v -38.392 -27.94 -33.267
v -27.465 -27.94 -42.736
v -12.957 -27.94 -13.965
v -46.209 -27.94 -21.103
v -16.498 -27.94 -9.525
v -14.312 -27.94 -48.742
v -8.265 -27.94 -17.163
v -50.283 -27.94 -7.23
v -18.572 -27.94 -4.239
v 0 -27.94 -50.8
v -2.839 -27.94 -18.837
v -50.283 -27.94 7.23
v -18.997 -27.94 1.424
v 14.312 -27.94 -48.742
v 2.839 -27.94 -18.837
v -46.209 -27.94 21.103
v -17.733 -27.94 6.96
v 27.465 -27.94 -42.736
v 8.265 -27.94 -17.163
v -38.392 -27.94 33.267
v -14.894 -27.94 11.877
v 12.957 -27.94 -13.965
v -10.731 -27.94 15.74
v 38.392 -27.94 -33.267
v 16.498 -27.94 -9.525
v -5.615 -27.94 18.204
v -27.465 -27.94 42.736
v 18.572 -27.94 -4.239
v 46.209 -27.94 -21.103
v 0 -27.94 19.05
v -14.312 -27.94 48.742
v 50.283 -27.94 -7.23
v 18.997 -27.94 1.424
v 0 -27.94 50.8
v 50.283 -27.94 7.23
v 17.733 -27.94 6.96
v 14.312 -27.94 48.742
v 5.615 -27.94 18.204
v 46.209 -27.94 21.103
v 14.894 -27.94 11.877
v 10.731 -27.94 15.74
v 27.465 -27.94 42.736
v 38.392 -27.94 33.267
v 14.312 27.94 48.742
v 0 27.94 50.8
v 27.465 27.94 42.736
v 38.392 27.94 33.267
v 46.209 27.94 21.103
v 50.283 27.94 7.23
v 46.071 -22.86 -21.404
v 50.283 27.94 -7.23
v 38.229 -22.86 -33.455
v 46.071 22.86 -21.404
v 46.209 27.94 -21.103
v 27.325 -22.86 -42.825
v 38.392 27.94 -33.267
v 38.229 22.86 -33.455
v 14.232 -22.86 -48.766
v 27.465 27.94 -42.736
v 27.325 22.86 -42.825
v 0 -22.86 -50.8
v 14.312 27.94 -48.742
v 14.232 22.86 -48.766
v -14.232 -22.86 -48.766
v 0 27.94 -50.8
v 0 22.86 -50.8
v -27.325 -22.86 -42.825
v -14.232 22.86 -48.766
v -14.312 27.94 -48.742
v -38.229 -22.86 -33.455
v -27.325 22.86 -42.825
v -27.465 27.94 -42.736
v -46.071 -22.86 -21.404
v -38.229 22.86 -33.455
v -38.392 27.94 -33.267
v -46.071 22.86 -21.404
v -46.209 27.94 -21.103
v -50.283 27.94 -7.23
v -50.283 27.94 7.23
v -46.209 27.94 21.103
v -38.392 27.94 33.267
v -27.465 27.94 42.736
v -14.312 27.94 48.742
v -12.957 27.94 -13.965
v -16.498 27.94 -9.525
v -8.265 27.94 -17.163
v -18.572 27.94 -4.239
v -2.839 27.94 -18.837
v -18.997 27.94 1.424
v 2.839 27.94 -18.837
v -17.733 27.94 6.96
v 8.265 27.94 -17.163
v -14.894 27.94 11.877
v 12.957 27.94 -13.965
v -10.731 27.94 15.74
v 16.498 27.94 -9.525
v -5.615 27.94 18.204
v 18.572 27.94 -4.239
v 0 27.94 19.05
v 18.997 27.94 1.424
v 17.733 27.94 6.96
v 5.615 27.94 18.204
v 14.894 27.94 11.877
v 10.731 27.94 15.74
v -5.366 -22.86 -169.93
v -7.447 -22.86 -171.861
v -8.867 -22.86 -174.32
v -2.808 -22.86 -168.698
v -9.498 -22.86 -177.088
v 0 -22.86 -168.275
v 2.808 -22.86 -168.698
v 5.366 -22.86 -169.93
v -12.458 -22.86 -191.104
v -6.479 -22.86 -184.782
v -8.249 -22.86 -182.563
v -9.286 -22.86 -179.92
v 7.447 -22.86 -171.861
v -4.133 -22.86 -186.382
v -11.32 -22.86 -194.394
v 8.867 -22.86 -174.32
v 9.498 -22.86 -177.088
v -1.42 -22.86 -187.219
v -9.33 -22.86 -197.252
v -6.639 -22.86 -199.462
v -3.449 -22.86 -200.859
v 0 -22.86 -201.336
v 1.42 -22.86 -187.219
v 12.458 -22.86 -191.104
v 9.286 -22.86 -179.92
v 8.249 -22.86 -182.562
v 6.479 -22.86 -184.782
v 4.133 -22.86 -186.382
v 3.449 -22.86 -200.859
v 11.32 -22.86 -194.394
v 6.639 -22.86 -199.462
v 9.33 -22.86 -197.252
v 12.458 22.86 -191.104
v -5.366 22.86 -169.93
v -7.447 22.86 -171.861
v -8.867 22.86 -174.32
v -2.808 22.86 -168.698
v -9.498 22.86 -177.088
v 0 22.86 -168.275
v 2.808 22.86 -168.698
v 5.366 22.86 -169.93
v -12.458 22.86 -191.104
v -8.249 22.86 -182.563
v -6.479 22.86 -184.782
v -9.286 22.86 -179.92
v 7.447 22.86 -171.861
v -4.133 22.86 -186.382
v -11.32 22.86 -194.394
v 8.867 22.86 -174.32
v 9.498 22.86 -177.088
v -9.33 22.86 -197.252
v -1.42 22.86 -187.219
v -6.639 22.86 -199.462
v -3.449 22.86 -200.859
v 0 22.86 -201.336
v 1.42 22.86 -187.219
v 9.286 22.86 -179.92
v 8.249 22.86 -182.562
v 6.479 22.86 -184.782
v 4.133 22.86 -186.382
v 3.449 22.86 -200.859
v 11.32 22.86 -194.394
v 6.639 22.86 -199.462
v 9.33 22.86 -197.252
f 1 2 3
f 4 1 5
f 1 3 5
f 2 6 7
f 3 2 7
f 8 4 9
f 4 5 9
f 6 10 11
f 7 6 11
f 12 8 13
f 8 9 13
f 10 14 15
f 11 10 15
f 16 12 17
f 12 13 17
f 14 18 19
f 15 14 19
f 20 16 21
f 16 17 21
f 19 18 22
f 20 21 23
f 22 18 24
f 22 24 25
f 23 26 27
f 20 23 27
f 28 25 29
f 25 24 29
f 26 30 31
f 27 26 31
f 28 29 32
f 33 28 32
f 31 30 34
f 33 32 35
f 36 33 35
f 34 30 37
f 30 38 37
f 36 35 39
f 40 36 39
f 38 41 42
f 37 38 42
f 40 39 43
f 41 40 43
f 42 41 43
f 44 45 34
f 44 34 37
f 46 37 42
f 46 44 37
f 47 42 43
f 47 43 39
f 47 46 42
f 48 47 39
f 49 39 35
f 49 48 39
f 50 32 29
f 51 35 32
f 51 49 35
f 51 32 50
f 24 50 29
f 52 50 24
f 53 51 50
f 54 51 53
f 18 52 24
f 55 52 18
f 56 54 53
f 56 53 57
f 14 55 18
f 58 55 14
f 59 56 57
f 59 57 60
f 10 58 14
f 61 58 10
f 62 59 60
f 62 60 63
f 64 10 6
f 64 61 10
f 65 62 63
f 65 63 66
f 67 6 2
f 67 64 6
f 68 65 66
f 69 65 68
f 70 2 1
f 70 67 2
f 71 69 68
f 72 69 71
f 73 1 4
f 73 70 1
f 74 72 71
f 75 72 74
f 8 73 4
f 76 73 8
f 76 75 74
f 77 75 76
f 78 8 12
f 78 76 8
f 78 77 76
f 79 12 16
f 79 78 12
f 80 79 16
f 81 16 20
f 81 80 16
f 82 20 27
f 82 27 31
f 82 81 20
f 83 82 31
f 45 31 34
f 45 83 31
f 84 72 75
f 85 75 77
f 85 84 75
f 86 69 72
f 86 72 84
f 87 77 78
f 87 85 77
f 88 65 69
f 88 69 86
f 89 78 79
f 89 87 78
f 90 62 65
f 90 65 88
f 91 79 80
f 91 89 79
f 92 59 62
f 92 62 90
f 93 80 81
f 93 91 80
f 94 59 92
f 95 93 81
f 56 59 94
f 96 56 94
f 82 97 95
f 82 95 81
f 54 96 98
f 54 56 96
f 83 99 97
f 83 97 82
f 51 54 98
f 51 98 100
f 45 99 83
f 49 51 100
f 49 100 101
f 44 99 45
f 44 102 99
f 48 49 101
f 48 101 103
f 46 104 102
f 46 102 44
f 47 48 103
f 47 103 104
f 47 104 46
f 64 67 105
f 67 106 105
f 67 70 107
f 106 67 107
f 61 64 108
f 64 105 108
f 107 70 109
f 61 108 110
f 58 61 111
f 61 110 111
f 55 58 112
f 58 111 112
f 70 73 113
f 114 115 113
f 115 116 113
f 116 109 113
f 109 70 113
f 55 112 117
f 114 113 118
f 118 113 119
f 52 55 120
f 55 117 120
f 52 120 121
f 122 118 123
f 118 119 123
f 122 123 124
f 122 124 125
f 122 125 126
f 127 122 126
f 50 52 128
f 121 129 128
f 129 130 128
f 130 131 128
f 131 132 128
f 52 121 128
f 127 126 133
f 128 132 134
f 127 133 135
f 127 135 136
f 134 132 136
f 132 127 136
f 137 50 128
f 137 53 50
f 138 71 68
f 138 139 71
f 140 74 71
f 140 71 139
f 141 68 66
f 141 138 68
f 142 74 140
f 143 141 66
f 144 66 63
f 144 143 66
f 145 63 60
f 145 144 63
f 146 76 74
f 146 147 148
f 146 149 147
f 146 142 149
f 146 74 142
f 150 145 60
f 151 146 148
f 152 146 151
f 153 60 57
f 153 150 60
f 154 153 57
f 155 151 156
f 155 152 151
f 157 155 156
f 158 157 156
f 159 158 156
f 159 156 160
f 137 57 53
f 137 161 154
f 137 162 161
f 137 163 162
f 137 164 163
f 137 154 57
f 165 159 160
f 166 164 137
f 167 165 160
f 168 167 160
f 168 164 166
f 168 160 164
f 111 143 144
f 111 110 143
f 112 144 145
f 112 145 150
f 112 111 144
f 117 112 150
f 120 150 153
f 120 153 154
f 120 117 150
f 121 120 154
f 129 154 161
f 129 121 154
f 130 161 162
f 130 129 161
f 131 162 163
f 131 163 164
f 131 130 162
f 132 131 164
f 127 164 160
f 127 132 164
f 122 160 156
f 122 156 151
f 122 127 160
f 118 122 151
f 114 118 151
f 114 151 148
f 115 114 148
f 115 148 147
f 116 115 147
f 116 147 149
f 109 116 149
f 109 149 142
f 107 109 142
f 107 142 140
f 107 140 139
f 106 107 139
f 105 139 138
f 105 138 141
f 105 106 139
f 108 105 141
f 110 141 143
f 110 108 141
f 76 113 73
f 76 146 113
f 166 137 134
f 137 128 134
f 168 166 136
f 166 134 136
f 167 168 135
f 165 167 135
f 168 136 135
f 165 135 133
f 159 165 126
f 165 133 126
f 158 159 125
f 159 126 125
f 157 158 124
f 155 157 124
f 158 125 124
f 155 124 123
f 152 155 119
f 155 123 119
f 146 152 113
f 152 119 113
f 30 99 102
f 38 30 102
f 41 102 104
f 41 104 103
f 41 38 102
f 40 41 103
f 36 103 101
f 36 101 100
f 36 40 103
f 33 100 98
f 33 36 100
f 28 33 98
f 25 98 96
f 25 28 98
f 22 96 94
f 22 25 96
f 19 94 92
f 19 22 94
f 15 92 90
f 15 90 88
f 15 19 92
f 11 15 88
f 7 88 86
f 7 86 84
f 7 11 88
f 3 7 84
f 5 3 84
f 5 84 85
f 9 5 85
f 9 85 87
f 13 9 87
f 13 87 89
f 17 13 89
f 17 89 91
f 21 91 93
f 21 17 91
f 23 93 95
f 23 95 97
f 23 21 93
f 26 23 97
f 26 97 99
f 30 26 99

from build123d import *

# Parameters (mm, degrees)
SKETCH1_R           = 50.8
SKETCH1_R_2         = 19.05
BOSS_EXTRUDE1_DEPTH = 27.94
SKETCH3_R           = 9.525
BOSS_EXTRUDE3_DEPTH = 22.86
FILLET1_R           = 12.7


with BuildPart() as part:
    # Sketch1 → Boss-Extrude1 (new, symmetric)
    with BuildSketch(Plane(origin=(0, 0, 0), x_dir=(1, 0, 0), z_dir=(0, 1, 0))):
        with Locations(Location((0, 0, 0), (0, 0, 270))):
            Circle(SKETCH1_R)
        with Locations(Location((0, 0, 0), (0, 0, 270))):
            Circle(SKETCH1_R_2, mode=Mode.SUBTRACT)
    extrude(amount=BOSS_EXTRUDE1_DEPTH, both=True)

    # Sketch3 → Boss-Extrude3 (add, symmetric)
    with BuildSketch(Plane(origin=(0, 0, 0), x_dir=(1, 0, 0), z_dir=(0, 1, 0))):
        Polygon((-46.070521031, 21.404370862), (46.070521031, 21.404370862), (0, 254), align=None)
        with Locations(Location((0, 177.8, 0), (0, 0, 270))):
            Circle(SKETCH3_R, mode=Mode.SUBTRACT)
    extrude(amount=BOSS_EXTRUDE3_DEPTH, both=True)

    # Fillet1
    fillet1_edges = [part.edges().sort_by_distance(p)[0] for p in [
        (0, 0, -254),
    ]]
    fillet(fillet1_edges, radius=FILLET1_R)


solid = part.part
